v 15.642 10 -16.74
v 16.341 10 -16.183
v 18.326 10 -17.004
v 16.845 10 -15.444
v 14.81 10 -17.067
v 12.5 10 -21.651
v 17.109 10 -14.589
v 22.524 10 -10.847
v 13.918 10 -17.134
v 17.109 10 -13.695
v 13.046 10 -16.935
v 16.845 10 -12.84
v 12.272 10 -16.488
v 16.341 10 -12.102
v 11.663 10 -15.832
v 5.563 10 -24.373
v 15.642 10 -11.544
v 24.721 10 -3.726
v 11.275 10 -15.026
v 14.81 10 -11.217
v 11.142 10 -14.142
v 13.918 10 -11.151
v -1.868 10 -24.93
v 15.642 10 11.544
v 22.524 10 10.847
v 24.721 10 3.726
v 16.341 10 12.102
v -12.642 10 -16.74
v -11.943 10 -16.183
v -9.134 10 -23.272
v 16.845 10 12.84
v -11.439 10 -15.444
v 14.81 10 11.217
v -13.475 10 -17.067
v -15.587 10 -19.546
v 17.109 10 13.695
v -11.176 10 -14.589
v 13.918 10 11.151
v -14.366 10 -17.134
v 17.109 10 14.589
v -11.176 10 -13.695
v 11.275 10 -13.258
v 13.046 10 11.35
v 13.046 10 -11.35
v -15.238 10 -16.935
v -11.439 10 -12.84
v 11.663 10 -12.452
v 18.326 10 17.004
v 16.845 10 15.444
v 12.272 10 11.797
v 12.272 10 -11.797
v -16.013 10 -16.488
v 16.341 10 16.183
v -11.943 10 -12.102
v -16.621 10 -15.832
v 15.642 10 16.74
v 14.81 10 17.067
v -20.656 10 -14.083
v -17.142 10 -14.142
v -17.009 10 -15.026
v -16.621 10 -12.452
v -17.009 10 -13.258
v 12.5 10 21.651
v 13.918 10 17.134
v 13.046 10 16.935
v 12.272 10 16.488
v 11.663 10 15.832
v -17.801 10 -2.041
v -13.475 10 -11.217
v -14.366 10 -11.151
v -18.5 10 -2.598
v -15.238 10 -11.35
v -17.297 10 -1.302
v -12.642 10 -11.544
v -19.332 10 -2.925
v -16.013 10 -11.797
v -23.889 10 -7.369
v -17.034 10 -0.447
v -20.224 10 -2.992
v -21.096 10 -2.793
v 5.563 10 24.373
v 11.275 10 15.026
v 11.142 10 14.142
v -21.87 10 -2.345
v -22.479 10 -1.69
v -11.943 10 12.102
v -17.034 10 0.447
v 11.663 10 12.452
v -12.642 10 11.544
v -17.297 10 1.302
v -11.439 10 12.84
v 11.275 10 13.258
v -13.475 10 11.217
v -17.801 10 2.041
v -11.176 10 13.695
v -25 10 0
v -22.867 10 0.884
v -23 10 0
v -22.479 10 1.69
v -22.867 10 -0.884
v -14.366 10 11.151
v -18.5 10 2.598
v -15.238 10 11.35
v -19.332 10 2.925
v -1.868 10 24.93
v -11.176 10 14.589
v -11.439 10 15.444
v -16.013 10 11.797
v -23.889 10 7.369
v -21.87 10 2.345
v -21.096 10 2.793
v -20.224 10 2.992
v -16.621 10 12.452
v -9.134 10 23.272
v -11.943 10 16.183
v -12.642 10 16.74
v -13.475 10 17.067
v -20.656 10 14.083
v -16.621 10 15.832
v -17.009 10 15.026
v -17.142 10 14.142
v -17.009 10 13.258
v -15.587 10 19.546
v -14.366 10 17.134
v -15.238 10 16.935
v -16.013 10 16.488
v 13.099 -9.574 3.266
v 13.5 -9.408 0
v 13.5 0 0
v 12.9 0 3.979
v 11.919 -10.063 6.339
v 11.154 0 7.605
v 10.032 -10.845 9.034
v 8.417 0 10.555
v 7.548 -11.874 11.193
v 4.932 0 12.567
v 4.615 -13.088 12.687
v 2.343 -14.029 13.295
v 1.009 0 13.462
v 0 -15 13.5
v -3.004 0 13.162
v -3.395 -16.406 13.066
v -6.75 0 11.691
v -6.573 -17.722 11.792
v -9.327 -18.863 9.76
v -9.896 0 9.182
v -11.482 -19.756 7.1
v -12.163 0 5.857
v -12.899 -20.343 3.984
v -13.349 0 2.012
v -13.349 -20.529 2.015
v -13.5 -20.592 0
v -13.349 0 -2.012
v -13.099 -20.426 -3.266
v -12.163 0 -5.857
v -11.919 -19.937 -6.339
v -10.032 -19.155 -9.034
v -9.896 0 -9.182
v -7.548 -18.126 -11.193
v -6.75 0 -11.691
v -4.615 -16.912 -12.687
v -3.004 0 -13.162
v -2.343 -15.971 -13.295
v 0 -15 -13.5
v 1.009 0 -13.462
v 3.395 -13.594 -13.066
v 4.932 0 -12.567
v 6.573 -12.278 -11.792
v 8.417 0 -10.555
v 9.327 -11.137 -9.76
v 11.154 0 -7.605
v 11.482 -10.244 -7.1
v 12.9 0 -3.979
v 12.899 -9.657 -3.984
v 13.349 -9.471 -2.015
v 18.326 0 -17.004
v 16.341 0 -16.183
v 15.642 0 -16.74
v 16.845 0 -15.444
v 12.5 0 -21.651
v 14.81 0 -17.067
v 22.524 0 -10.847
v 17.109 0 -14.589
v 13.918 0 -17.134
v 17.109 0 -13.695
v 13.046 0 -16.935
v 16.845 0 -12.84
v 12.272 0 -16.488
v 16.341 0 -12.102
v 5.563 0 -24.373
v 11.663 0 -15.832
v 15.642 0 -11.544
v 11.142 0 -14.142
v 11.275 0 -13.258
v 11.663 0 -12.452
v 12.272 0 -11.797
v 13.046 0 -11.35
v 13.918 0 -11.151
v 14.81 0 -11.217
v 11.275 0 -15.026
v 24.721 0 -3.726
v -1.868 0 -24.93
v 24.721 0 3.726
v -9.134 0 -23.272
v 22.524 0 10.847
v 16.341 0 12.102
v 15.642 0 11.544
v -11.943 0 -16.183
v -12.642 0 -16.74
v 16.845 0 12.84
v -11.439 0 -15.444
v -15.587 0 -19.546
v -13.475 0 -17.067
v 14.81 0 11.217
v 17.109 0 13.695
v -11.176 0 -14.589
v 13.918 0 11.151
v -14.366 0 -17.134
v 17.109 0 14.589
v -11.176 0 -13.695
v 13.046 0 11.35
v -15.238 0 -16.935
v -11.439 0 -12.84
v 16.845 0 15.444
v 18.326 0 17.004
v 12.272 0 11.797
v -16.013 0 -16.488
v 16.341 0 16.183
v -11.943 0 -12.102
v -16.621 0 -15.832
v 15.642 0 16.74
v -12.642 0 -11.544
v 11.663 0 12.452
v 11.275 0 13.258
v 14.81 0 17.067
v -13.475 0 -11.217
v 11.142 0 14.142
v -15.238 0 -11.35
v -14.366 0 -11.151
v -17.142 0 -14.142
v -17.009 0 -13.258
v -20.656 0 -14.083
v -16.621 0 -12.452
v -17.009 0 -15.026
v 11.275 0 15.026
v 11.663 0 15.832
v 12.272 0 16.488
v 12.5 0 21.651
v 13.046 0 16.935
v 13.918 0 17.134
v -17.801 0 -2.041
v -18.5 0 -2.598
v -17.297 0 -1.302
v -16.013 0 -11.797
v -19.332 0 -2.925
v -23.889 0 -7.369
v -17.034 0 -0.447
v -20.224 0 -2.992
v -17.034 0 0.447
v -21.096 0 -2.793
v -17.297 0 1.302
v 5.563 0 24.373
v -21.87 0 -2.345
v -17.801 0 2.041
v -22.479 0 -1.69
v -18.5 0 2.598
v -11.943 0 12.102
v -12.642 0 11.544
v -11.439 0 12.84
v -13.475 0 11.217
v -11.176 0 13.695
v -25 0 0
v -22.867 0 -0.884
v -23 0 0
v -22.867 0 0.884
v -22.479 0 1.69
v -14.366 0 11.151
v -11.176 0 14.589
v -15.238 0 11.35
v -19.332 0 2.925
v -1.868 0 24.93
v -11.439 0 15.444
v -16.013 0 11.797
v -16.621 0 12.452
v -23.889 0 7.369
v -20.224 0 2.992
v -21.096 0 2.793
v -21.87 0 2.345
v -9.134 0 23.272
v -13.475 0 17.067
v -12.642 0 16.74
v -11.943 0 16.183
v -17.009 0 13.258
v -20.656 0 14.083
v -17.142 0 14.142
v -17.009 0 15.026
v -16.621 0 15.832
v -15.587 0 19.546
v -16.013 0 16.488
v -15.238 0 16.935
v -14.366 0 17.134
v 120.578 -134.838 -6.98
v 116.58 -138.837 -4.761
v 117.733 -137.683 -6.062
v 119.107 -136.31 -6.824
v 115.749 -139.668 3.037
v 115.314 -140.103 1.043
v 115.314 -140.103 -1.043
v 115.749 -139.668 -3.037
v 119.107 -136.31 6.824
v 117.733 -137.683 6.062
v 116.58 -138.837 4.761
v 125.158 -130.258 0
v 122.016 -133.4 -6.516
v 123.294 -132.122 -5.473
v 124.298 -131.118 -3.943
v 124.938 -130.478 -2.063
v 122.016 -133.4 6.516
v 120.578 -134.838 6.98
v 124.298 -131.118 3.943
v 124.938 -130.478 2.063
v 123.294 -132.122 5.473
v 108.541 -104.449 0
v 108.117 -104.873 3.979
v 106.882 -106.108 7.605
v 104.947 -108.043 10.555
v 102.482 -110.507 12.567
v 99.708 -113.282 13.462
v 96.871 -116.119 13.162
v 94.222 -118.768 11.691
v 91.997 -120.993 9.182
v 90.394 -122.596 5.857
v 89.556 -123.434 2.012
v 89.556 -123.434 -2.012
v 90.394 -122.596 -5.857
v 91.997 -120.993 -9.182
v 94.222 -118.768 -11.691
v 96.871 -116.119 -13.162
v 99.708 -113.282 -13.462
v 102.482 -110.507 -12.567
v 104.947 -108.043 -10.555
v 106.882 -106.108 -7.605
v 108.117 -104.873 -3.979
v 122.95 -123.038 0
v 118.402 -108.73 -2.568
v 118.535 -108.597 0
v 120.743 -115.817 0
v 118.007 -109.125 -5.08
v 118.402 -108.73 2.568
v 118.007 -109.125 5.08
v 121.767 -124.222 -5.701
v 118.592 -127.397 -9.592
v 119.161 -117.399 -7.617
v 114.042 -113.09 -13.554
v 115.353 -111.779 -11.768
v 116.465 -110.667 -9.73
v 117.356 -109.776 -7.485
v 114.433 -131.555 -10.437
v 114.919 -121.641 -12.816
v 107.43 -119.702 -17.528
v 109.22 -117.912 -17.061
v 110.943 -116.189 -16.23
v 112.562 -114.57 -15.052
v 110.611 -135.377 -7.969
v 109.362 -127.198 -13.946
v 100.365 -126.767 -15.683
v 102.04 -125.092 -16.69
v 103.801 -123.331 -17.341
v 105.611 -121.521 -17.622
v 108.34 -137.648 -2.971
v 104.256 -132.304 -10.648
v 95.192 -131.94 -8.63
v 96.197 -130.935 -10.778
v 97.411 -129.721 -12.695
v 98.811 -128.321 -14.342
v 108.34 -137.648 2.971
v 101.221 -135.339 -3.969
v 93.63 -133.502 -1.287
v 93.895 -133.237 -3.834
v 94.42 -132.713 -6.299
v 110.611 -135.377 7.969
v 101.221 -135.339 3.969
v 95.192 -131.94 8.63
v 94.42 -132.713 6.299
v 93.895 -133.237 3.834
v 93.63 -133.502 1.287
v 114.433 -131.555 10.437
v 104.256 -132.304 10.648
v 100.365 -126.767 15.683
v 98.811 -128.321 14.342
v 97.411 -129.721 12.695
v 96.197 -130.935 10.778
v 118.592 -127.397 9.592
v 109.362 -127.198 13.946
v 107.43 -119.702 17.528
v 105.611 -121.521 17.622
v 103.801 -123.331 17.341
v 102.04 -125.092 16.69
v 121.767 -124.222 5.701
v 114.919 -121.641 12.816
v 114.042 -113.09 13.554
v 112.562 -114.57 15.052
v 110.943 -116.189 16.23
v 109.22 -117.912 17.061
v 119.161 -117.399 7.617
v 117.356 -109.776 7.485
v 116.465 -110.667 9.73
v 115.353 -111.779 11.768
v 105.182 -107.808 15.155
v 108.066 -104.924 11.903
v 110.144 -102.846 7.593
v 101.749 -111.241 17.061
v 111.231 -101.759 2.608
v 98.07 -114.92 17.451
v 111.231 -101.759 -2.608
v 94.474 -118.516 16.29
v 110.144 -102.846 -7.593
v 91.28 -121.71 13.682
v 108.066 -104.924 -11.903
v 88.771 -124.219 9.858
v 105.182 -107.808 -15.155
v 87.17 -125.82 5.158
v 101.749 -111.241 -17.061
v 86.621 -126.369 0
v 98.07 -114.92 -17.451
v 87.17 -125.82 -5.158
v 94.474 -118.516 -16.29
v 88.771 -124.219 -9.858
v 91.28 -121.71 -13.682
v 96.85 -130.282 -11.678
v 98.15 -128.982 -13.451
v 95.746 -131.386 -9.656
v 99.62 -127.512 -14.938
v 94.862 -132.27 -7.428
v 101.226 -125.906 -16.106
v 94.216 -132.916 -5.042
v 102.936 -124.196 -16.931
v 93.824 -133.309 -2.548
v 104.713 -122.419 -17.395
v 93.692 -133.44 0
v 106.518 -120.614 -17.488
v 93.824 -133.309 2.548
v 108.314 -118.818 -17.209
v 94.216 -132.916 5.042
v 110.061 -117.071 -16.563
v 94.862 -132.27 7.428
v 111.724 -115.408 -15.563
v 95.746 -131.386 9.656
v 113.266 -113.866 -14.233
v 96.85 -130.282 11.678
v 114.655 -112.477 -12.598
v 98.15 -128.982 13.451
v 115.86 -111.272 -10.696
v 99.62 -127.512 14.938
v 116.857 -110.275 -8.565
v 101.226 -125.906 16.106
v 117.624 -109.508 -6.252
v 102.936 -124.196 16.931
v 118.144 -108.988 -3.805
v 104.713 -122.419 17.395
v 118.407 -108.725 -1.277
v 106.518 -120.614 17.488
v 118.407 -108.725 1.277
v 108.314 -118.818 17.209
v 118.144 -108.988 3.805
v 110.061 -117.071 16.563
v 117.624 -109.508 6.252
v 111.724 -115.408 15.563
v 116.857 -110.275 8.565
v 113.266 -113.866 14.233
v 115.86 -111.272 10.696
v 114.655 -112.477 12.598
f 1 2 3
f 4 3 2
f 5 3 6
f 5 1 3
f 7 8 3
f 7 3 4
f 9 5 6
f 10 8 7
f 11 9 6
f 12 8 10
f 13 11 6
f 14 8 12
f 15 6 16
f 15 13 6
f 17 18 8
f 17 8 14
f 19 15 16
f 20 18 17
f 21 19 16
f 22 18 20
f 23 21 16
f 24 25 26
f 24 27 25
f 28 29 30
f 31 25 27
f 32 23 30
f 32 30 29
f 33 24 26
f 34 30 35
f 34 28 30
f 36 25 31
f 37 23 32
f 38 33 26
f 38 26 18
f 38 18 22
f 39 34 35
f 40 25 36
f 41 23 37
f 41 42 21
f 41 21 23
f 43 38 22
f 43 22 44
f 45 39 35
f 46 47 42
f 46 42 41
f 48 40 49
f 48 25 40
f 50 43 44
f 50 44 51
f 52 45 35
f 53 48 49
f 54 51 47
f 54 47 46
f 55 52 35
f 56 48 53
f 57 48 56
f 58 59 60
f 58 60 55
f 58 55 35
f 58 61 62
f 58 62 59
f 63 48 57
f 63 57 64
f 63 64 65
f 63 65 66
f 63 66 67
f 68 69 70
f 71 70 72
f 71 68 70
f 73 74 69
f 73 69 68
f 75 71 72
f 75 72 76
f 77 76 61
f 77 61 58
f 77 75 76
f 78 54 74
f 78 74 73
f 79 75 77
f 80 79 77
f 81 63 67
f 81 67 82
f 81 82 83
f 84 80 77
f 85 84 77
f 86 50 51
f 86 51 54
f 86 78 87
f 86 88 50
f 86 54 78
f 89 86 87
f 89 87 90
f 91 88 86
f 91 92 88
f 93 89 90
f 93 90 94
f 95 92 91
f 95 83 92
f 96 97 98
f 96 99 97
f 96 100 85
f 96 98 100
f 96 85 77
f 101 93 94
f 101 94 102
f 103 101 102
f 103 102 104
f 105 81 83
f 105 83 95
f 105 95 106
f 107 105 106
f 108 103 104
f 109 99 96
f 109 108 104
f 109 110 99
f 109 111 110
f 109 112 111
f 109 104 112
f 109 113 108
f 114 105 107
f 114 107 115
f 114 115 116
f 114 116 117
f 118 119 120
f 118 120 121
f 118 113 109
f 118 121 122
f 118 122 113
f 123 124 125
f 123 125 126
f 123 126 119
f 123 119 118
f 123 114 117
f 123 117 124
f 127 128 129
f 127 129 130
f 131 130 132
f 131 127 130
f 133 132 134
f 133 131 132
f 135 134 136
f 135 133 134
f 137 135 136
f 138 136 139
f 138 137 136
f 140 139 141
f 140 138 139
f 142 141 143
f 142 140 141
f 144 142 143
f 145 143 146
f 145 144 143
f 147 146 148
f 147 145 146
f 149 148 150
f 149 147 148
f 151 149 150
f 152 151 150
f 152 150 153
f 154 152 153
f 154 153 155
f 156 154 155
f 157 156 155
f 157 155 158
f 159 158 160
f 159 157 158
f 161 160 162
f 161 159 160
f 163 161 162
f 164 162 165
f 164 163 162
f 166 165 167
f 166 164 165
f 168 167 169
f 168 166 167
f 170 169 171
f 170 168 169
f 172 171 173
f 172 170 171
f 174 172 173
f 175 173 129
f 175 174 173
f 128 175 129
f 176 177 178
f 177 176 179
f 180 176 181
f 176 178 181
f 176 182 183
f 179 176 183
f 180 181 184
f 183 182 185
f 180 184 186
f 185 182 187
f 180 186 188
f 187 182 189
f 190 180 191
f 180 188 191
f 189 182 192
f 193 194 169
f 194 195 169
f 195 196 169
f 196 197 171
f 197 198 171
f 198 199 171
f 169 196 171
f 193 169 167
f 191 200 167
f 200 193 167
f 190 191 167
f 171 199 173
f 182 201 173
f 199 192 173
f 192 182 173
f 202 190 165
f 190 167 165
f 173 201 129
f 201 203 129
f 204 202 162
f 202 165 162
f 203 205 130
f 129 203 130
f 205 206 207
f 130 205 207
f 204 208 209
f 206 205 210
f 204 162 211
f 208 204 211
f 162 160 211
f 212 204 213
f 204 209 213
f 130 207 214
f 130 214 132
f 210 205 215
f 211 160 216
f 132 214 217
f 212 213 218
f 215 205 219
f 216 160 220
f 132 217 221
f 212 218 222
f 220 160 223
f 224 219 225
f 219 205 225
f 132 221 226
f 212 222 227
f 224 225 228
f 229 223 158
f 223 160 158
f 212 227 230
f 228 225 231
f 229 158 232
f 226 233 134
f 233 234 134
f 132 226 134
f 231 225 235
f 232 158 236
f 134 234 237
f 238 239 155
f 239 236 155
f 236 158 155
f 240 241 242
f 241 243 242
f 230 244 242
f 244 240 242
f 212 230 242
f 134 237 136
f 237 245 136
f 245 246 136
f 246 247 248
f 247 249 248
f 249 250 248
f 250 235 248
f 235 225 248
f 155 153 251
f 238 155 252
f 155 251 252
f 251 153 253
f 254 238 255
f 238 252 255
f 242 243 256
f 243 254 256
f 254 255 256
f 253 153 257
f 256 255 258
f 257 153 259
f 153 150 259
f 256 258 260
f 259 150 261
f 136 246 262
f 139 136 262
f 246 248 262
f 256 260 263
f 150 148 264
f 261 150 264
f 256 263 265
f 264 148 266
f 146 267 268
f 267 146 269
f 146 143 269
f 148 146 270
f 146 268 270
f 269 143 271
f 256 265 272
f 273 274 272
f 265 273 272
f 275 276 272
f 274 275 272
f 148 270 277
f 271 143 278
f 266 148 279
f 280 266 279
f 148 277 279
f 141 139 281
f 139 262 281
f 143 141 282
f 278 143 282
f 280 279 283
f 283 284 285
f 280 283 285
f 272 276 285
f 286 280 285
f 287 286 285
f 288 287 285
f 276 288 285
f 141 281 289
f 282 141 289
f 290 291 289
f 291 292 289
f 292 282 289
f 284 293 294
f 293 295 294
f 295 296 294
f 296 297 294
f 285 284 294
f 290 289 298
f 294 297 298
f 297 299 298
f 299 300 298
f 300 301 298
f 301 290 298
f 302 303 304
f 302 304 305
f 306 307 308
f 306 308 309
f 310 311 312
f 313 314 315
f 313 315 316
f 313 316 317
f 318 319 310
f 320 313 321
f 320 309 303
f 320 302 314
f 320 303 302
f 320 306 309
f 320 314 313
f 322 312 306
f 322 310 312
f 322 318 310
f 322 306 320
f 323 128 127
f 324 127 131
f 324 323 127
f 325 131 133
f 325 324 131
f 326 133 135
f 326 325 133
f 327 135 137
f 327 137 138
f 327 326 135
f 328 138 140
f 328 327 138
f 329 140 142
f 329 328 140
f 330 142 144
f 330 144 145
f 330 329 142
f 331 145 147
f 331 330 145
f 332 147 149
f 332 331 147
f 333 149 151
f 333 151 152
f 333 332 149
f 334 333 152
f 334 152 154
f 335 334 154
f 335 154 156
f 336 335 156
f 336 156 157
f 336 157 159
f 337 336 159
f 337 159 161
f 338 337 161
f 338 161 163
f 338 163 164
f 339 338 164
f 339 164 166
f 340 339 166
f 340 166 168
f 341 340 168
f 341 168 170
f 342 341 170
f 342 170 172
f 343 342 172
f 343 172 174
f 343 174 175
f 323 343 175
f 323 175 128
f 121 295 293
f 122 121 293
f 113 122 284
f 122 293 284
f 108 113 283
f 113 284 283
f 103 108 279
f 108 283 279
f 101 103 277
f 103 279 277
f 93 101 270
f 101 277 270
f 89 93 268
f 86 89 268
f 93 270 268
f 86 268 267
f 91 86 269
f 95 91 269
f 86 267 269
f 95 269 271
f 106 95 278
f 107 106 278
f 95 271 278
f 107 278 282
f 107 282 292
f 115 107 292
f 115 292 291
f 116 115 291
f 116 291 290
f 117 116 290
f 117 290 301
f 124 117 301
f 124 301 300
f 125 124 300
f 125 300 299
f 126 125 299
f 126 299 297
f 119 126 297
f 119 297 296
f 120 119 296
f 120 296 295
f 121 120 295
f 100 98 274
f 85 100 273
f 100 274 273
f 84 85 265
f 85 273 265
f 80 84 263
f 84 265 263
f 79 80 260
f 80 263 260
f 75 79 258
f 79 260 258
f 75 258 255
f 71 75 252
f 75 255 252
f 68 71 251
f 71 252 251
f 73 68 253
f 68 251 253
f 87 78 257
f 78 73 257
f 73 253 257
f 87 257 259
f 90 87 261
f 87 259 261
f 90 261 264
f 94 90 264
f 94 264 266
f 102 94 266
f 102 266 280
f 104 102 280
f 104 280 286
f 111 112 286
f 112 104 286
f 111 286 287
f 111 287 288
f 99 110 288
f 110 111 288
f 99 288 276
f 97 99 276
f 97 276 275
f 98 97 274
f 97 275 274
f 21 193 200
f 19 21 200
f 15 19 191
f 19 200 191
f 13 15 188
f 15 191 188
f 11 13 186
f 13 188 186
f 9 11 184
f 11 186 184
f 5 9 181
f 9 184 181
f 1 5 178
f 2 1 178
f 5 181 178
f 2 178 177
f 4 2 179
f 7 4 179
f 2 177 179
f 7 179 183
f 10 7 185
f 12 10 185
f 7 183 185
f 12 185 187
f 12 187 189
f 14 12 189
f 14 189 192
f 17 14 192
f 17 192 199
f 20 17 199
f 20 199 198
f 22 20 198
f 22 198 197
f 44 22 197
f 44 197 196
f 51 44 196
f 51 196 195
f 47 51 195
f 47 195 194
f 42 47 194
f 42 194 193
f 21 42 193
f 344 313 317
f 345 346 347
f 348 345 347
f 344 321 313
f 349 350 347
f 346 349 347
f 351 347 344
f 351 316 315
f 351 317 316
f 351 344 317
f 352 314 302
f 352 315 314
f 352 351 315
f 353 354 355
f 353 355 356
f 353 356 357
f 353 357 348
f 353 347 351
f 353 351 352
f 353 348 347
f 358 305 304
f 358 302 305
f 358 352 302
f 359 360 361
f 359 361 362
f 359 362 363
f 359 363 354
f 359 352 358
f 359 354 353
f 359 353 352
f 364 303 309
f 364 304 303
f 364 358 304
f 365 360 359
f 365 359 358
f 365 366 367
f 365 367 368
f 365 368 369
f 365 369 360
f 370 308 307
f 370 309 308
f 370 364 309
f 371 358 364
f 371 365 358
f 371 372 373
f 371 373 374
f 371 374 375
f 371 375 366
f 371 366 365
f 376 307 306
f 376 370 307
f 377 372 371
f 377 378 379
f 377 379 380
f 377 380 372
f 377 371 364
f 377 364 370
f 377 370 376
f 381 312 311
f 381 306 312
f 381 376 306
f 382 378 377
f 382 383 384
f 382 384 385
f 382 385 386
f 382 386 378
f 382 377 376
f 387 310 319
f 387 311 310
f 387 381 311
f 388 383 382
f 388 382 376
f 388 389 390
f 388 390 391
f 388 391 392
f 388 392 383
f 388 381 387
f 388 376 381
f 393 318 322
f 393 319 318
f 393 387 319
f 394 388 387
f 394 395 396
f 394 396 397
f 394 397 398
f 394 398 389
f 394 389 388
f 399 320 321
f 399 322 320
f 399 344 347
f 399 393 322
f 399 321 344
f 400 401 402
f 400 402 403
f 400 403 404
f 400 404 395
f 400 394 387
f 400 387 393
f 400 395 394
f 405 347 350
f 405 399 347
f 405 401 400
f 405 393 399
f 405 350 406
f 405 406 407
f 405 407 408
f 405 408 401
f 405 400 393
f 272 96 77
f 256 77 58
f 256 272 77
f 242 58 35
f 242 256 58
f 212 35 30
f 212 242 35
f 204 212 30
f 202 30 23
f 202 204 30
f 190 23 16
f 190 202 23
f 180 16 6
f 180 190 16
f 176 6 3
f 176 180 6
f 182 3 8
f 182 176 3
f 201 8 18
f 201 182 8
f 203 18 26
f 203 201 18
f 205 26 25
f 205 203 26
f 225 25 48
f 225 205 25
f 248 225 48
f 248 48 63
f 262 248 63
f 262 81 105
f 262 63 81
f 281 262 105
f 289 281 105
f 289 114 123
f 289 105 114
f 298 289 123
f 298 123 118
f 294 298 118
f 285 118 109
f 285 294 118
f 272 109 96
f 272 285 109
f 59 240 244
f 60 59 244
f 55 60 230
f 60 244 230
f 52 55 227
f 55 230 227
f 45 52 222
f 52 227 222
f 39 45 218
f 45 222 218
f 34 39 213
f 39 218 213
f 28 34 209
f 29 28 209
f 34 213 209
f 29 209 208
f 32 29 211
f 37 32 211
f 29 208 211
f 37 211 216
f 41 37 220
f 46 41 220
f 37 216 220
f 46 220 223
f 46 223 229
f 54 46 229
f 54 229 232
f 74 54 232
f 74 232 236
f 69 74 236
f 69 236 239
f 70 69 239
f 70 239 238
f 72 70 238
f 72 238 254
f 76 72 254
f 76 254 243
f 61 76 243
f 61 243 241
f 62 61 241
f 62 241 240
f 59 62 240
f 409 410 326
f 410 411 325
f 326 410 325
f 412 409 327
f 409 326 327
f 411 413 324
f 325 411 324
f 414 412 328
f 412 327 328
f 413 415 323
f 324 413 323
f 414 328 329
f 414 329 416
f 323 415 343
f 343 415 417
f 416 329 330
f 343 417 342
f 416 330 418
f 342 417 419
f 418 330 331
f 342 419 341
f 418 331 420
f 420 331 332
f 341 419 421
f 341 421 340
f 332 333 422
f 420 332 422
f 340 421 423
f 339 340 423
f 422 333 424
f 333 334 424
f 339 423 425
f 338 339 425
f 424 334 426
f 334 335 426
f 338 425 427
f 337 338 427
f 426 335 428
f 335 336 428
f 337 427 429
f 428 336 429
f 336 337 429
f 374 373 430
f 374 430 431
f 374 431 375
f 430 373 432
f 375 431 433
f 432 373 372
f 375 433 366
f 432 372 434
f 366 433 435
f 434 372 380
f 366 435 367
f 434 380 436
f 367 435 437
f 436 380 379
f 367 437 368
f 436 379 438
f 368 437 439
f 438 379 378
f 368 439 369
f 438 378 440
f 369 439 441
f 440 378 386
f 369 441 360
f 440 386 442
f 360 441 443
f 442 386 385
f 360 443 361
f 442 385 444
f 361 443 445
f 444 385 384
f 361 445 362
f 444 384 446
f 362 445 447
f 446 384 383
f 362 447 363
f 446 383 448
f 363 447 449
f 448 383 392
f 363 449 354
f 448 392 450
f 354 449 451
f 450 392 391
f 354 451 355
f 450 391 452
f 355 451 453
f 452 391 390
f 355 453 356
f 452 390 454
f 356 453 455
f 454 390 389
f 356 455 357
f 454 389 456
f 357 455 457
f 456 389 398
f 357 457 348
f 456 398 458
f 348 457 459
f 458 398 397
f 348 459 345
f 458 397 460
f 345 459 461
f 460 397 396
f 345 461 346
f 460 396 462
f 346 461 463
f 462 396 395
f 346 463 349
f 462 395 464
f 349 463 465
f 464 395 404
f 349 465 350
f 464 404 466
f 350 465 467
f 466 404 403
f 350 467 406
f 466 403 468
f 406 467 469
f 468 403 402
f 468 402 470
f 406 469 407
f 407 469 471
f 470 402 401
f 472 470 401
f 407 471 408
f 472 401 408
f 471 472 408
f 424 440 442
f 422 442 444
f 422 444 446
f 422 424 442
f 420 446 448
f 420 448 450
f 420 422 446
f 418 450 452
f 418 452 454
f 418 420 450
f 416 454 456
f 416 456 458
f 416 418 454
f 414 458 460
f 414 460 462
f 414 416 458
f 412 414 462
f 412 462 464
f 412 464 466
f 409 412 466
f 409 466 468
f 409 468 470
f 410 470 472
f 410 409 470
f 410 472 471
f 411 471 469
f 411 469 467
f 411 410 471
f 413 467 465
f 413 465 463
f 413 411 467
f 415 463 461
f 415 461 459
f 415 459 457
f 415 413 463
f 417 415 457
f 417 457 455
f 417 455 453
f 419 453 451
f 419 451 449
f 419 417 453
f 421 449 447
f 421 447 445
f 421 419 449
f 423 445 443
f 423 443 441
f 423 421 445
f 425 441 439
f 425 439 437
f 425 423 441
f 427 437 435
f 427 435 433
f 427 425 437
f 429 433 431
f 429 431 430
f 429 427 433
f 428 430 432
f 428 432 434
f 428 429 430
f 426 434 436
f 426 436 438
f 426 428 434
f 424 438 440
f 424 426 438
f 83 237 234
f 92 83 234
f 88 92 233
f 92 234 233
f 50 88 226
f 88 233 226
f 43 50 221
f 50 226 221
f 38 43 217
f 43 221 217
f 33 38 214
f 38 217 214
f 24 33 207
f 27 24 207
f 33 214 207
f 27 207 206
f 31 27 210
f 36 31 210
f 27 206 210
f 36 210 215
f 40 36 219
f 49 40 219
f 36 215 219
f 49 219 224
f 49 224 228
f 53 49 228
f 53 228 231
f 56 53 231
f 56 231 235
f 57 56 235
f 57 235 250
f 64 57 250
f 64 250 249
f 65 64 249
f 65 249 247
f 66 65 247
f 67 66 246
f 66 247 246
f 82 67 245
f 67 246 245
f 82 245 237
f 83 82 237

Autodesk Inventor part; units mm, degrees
ref_plane "YZ Plane" through (0, 0, 0) normal (1, 0, 0) x (0, 1, 0)
ref_plane "XZ Plane" through (0, 0, 0) normal (0, 1, 0) x (-1, 0, 0)
ref_plane "XY Plane" through (0, 0, 0) normal (0, 0, 1) x (1, 0, 0)
sketch "Boceto1" plane through (0, 0, 0) normal (0, 1, 0) x (-1, 0, 0)
  circle A0 centre (0, 0) radius 25
  circle A1 centre (0, 0) radius 20
  line L0 (0, 0) -> (25, 0)
  line L1 (0, 0) -> (17.67767, -17.67767)
  line L2 (0, 0) -> (25, 0) construction
  line L3 (0, 0) -> (17.67767, 17.67767)
  line L4 (0, 0) -> (25, 0) construction
  line L5 (0, 0) -> (-17.67767, -17.67767)
  line L6 (0, 0) -> (-17.67767, 17.67767)
  circle A2 centre (20, 0) radius 3
  circle A3 centre (14.142136, -14.142136) radius 3
  circle A4 centre (14.142136, 14.142136) radius 3
  circle A5 centre (-14.142136, 14.142136) radius 3
  circle A6 centre (-14.142136, -14.142136) radius 3
  point P0 (16.098382, 11.867691)
  point P1 (11.867691, 16.098382)
  dimension "d0" = 50
  dimension "d1" = 40
  dimension "d2" = 45
  dimension "d3" = 45
  dimension "d4" = 6
  dimension "d5" = 6
  dimension "d6" = 6
  dimension "d7" = 6
  dimension "d8" = 6
extrude "Extrusión1" add sketch "Boceto1" along normal blind 10 contours L0 A2 A1 A4 L3 A0 | A0 L1 A3 A1 A2 L0 | L3 A4 A1 A5 L6 A0 | A0 L5 A6 A1 A3 L1 | L6 A5 A1 A6 L5 A0 | A2 L0 L3 A4 A1 | A1 A3 L1 L0 A2 | A4 L3 L6 A5 A1 | A1 A6 L5 L1 A3 | A5 L6 L5 A6 A1
thread "Rosca1"
thread "Rosca2"
thread "Rosca3"
thread "Rosca4"
sketch "Boceto7" plane through (0, 0, 0) normal (0, 0, 1) x (1, 0, 0)
  line L0 (0, 0) -> (0, -15)
  line L1 (0, -15) -> (98.994949, -113.994949)
  dimension "d31" = 15
  dimension "d32" = 140
  dimension "d33" = 135
sketch "Boceto8" plane through (0, 0, 0) normal (0, -1, 0) x (1, 0, 0)
  circle A0 centre (0, 0) radius 13.5
  dimension "d34" = 27
sweep "Barrido1" add profiles "Boceto8" path "Boceto7"
sketch "Boceto13" plane through (0, 0, 0) normal (0, 0, 1) x (1, 0, 0)
  line L0 (0, 0) -> (0, -15)
  line L1 (0, -15) -> (120.208153, -135.208153)
  dimension "d48" = 170
  dimension "d49" = 135
sketch "Boceto14" plane through (98.994949, -113.994949, 0) normal (0.7071068, -0.7071068, 0) x (-0.7071068, -0.7071068, 0)
  ellipse E0 centre (-17.67767, 0) end of major axis (-17.67767, -25) minor radius 17.67767
  circle A0 centre (0, 0) radius 17.5
  point P0 (-10.606602, 0)
  dimension "d50" = 35
extrude "Extrusión9" add sketch "Boceto14" along normal blind 10 contours A0 E0 | E0 A0 picked at (-5.916701, -1.209366) picked at (5.555683, -1.849173)
ref_plane "Plano de trabajo1" through (120.208153, -135.208153, 0) normal (0.7071068, -0.7071068, 0) x (0.7071068, 0.7071068, 0)
sketch "Boceto16" plane through (120.208153, -135.208153, 0) normal (0.7071068, -0.7071068, 0) x (0.7071068, 0.7071068, 0)
  ellipse E0 centre (17.67767, 0) end of major axis (17.67767, 25) minor radius 17.67767
  circle A0 centre (0, 0) radius 7
  point P0 (10.606602, 0)
  dimension "d58" = 14
sketch "Boceto16 outline for Extrusión10" plane through (120.208153, -135.208153, 0) normal (0.7071068, -0.7071068, 0) x (0.7071068, 0.7071068, 0)
  circle A0 centre (0, 0) radius 7
extrude "Extrusión10" add sketch "Boceto16 outline for Extrusión10" against normal blind 20 draft 28
properties part number "Herramienta total"
